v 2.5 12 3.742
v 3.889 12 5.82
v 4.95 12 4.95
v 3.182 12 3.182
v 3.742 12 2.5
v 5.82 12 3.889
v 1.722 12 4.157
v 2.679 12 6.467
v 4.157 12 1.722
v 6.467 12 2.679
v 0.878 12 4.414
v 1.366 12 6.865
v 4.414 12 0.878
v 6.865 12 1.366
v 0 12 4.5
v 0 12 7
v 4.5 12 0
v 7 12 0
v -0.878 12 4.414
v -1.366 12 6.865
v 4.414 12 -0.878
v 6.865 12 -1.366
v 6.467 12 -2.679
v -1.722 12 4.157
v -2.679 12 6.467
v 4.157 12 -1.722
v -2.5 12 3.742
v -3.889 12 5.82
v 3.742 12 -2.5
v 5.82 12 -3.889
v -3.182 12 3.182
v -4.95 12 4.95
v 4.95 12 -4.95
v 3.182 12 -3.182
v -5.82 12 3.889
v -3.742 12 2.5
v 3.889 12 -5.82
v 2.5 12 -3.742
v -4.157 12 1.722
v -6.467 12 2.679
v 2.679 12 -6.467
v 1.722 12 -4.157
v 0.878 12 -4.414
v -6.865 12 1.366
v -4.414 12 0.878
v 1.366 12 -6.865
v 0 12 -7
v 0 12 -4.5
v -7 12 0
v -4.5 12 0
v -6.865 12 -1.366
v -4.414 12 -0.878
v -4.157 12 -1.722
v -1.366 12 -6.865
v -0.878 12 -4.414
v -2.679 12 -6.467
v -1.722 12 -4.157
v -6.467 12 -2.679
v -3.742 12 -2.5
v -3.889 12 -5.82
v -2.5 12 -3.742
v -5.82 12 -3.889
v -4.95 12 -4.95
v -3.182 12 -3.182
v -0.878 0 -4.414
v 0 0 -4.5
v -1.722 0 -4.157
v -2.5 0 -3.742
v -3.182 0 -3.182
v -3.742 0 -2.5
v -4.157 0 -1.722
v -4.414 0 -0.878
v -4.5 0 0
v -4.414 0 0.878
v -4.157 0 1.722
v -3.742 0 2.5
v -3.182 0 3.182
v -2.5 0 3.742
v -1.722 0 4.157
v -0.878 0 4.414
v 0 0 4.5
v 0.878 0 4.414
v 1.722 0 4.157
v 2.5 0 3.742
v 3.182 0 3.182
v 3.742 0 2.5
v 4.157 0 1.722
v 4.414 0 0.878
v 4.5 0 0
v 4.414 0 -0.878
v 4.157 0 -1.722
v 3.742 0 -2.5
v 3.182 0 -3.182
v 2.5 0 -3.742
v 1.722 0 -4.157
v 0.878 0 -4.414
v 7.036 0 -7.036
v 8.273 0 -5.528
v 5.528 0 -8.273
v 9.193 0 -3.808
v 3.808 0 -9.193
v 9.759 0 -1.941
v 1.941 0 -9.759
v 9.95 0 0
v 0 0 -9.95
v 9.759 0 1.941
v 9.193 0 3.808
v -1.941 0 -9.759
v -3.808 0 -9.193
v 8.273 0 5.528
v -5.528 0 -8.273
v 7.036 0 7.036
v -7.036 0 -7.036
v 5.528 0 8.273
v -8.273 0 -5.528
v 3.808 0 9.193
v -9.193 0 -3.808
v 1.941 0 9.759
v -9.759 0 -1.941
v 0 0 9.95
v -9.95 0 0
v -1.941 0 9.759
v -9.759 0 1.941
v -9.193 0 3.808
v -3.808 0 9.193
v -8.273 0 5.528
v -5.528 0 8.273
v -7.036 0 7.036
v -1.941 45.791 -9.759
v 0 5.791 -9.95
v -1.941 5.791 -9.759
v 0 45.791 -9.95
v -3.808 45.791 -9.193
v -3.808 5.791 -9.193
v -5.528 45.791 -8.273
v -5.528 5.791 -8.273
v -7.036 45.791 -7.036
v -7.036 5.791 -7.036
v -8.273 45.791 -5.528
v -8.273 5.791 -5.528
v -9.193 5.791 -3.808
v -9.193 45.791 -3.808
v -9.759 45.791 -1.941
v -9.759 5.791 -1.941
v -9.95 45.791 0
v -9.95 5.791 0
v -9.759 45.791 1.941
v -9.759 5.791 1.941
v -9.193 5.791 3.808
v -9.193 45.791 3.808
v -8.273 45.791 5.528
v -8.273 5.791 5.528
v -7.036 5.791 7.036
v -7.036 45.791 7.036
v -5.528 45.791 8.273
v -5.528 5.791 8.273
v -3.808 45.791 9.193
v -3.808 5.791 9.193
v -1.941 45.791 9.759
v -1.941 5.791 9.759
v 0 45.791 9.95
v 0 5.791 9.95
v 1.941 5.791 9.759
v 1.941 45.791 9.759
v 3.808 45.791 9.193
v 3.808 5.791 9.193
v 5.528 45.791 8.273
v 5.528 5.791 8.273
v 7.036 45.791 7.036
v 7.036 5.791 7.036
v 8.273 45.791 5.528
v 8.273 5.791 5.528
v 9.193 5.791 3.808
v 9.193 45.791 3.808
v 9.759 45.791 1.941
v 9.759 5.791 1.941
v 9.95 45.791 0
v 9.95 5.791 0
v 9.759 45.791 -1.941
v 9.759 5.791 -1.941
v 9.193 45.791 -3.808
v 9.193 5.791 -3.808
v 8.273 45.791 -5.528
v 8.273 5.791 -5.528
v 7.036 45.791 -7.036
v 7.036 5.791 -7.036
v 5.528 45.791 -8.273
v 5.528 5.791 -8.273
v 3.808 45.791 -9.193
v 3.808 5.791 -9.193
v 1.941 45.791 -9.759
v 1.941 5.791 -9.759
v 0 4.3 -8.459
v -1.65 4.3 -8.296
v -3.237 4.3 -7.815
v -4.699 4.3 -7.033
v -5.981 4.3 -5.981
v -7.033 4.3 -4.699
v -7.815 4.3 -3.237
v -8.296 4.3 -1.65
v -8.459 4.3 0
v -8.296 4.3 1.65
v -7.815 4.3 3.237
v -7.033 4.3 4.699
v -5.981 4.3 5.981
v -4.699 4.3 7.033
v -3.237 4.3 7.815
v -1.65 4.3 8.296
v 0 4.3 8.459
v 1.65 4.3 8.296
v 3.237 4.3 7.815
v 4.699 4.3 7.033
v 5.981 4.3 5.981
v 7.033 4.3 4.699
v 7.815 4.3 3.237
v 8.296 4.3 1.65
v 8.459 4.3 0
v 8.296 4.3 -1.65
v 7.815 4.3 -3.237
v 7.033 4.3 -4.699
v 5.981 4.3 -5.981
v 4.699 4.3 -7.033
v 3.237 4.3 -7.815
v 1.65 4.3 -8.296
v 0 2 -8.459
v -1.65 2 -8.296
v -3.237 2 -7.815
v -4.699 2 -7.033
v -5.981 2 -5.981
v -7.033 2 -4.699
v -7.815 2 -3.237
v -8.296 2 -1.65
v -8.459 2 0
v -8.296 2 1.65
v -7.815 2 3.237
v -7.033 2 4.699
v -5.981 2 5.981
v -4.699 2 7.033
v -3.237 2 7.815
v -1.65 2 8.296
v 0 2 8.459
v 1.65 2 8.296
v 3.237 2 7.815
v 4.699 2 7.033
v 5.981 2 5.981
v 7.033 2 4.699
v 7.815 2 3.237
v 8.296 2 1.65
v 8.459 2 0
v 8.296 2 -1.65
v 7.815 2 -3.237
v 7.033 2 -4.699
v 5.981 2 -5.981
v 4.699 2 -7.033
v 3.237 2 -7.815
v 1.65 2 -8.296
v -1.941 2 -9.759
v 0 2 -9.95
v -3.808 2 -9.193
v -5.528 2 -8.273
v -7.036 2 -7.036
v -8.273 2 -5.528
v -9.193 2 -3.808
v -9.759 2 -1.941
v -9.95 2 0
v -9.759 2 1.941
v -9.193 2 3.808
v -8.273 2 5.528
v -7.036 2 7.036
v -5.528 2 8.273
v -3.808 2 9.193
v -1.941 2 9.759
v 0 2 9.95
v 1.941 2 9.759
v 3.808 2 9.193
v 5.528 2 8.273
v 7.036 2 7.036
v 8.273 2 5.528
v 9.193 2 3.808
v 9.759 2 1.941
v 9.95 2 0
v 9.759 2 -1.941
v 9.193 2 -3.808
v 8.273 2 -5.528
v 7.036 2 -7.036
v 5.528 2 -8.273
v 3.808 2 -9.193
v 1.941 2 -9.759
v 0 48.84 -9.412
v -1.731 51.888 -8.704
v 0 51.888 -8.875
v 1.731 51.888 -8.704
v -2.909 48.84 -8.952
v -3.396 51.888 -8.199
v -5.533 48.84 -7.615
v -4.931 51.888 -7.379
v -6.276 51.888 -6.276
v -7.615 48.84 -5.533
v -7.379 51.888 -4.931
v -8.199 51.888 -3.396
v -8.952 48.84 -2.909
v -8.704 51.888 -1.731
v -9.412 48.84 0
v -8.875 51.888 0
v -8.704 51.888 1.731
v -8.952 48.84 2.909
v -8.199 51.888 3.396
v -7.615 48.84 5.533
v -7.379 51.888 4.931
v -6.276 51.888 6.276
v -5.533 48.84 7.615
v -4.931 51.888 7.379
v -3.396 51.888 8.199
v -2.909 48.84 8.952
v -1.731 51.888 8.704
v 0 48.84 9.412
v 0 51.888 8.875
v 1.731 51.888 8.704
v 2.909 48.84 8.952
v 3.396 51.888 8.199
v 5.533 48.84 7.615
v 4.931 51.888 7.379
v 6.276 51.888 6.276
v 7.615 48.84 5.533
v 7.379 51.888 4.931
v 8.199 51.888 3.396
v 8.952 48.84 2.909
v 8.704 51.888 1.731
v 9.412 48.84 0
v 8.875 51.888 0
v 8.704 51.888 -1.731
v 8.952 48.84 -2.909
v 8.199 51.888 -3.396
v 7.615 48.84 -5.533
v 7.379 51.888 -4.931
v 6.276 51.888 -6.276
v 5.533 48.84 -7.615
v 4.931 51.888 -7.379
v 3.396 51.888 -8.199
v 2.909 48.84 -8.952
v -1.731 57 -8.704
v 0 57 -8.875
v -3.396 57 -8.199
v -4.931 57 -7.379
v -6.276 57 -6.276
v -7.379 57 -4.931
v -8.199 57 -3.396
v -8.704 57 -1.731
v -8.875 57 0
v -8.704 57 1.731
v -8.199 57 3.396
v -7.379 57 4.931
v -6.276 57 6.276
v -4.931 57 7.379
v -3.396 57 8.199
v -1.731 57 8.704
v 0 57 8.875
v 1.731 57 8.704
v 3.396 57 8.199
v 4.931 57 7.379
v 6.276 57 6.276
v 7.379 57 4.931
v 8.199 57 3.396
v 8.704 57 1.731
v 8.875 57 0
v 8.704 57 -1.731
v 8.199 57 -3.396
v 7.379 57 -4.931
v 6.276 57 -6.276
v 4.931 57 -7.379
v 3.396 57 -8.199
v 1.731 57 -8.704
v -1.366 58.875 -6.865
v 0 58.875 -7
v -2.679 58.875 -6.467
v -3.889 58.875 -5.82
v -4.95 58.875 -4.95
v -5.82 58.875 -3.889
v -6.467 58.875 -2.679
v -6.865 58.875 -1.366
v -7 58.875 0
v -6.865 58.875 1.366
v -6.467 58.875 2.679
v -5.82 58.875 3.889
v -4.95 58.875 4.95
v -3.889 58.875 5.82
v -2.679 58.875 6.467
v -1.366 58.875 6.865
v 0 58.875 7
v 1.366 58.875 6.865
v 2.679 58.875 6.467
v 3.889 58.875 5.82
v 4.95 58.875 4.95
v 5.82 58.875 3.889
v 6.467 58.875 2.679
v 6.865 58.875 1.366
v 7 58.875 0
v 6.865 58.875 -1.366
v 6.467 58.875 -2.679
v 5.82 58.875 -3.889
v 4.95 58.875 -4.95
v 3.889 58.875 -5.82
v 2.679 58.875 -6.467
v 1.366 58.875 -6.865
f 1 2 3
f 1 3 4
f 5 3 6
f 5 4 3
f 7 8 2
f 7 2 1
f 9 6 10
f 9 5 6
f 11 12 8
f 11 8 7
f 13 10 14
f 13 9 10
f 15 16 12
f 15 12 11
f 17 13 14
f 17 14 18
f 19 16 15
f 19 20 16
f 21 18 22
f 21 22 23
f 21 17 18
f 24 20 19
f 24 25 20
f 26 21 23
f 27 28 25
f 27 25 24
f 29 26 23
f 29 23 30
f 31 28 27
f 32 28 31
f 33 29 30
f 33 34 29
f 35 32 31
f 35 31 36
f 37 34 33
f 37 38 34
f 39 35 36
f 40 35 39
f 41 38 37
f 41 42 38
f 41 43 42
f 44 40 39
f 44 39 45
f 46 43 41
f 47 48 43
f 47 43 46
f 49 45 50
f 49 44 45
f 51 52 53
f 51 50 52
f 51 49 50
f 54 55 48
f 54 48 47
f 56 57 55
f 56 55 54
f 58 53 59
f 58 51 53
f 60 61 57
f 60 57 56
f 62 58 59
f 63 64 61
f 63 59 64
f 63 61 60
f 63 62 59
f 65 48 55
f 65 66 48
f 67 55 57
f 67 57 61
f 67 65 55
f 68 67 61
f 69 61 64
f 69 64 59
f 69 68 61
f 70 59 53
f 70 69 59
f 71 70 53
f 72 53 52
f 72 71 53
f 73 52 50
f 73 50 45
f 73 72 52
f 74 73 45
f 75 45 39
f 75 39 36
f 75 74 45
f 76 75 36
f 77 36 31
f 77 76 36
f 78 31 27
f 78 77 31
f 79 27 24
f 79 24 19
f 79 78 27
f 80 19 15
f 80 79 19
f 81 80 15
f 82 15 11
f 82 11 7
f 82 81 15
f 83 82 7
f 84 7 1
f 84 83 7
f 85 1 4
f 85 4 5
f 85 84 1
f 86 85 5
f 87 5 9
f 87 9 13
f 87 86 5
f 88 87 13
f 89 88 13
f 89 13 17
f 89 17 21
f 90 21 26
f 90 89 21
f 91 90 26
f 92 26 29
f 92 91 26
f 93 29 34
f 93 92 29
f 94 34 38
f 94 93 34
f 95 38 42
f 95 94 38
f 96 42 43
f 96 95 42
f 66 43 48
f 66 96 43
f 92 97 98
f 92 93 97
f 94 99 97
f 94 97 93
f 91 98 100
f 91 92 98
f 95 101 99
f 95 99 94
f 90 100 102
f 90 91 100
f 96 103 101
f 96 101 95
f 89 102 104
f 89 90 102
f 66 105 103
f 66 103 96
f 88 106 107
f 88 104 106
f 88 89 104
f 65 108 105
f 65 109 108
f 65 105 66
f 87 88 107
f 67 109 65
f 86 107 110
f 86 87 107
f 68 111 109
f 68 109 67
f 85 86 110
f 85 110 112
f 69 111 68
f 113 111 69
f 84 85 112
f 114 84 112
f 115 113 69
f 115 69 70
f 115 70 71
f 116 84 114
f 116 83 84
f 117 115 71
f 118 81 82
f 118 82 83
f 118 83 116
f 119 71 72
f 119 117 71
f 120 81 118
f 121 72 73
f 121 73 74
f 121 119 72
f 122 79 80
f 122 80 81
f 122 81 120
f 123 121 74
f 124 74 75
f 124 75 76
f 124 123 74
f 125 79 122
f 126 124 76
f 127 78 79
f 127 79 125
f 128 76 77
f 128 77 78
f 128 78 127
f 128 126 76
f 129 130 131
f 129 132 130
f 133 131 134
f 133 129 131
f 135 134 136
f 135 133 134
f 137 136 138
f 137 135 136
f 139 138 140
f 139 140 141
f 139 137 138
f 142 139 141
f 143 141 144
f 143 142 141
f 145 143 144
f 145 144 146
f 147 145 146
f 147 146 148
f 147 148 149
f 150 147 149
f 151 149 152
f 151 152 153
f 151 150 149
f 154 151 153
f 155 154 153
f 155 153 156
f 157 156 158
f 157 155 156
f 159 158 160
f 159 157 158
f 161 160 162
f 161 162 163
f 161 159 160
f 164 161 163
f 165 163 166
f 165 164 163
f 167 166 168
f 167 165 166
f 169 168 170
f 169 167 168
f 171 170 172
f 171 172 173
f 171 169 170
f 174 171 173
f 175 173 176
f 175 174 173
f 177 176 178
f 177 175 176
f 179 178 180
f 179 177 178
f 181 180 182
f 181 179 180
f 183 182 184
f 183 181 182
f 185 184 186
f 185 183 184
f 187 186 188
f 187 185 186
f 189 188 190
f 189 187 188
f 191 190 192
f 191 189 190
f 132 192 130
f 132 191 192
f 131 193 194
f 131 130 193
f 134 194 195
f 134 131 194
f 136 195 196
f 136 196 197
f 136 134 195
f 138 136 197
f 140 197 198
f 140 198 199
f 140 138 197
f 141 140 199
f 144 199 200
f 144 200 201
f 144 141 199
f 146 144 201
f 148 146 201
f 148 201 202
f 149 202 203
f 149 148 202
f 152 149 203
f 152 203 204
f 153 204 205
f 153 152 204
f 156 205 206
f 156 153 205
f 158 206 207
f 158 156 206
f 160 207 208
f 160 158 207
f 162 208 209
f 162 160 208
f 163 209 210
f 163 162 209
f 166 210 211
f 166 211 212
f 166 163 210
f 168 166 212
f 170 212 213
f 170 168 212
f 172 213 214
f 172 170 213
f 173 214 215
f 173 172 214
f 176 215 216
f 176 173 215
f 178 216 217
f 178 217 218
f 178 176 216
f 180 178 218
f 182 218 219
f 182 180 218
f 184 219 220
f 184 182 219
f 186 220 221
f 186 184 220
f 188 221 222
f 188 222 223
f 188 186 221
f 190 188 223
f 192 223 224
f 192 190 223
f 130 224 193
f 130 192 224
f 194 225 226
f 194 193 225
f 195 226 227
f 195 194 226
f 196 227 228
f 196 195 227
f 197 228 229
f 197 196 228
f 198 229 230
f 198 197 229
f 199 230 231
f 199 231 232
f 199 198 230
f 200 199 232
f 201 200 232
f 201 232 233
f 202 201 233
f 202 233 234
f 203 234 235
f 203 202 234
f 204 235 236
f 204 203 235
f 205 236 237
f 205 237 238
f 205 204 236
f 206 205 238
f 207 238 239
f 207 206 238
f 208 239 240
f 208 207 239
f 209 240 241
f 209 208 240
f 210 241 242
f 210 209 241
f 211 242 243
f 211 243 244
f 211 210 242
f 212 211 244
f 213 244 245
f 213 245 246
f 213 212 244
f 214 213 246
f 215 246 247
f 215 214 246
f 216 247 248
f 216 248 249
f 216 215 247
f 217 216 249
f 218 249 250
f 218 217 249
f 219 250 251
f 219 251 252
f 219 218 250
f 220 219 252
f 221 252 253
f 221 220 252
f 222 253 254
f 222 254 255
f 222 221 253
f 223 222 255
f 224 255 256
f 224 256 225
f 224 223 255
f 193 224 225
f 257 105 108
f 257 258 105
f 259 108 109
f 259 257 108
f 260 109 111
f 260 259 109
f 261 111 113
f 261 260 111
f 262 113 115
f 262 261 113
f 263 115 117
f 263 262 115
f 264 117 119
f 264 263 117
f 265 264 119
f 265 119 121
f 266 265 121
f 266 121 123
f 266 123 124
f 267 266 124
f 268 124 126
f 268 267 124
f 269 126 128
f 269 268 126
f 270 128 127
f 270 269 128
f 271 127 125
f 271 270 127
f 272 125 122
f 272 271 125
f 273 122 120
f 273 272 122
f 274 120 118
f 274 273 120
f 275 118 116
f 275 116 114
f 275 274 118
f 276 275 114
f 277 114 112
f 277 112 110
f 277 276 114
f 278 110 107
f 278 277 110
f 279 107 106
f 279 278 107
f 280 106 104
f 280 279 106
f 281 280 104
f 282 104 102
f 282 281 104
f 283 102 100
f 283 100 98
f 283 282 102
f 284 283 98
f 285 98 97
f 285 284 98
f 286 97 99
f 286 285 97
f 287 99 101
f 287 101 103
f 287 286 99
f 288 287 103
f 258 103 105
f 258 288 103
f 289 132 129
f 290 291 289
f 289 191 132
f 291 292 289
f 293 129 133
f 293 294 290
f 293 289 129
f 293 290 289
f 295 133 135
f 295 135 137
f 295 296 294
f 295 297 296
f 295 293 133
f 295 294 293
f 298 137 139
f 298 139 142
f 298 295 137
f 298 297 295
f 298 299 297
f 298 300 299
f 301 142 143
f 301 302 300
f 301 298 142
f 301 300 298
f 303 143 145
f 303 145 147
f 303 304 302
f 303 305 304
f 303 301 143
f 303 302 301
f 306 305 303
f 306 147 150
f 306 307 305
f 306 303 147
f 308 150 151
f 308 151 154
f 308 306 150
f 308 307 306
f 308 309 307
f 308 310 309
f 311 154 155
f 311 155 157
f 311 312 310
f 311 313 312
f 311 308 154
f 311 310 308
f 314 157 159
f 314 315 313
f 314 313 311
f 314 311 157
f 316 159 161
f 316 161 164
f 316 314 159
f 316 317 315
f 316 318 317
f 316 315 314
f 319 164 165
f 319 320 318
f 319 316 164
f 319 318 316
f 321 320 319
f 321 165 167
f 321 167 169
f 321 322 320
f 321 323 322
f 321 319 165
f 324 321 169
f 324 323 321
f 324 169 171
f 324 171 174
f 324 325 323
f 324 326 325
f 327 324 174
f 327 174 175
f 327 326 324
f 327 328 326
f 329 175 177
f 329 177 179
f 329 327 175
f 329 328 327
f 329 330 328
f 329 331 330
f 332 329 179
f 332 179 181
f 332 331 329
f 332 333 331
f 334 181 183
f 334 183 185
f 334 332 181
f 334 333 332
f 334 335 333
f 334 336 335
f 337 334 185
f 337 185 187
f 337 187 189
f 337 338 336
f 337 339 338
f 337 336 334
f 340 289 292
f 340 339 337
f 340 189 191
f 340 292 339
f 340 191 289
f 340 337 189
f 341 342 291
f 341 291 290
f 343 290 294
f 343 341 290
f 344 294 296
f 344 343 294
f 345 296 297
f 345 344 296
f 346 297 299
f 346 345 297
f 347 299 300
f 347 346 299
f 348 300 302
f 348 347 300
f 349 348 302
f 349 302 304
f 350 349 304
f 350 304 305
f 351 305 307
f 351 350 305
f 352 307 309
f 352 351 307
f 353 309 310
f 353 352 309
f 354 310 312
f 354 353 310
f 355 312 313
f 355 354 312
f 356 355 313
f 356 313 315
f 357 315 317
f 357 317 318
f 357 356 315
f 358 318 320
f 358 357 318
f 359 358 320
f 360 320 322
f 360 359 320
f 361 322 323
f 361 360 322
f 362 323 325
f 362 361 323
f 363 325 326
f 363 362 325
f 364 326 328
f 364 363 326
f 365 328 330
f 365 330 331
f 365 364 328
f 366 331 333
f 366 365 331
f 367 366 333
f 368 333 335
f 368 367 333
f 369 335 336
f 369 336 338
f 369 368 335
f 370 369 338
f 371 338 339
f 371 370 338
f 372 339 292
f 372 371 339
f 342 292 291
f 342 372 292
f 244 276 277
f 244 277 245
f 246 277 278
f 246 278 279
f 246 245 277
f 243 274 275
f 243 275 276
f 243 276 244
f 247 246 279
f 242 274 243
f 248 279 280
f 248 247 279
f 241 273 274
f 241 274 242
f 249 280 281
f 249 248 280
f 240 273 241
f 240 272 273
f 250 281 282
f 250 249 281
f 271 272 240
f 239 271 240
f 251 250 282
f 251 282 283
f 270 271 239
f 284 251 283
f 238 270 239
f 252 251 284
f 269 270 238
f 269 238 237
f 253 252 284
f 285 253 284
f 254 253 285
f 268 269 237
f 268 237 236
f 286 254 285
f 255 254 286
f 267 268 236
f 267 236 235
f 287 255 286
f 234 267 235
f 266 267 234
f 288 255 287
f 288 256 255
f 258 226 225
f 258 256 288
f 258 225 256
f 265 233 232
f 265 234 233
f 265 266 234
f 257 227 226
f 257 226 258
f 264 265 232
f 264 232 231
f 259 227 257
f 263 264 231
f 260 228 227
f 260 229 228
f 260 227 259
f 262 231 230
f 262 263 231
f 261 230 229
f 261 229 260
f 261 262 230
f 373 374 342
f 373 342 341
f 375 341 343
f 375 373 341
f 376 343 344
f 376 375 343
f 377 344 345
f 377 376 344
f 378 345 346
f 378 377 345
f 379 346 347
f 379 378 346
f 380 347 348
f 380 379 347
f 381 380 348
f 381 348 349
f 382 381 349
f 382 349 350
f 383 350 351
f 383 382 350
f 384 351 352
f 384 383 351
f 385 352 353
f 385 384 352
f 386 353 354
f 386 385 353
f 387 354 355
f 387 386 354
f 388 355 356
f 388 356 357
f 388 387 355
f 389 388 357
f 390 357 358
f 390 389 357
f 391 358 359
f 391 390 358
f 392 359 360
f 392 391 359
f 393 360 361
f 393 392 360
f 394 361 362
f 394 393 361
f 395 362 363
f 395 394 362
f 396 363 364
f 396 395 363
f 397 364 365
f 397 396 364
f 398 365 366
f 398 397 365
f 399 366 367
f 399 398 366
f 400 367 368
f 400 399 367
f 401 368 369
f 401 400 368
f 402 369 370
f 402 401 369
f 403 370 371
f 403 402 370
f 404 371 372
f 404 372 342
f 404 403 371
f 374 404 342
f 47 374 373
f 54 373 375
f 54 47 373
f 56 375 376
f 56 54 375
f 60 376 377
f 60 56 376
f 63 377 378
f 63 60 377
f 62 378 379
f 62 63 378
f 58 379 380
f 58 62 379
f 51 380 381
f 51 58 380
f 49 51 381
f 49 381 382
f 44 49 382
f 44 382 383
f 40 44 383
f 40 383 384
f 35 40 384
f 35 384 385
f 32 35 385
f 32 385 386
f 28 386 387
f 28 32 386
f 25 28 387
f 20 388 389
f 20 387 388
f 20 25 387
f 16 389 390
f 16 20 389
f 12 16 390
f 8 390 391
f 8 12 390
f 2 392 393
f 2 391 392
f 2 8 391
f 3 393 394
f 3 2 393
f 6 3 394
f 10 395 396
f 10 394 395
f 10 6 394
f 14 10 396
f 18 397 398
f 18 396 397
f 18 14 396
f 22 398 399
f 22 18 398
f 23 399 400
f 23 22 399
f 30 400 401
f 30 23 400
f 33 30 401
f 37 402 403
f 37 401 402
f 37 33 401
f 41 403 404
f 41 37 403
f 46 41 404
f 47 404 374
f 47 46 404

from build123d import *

# Parameters (mm, degrees)
CHAMFER_1_SIZE = 3


with BuildPart() as part:
    # 스케치3 → 회전1 (revolve)
    with BuildSketch(Plane(origin=(0, 0, 0), x_dir=(0, 0, -1), z_dir=(1, 0, 0))):
        Polygon((4.5, 0), (9.95, 0), (9.95, 2), (8.458613311, 2), (8.458613311, 4.3), (9.95, 5.791386689), (9.95, 45.791386689), (8.875, 51.888014645), (8.875, 60), (7, 60), (7, 12), (4.5, 12), align=None)
    revolve(axis=Axis((0, 0, 0), (0, 1, 0)))

    # 모따기1
    # the kernel refuses this chamfer: 3 mm, written as the material it takes off along each edge
    with BuildSketch(Plane(origin=(0, 60, 0), x_dir=(0, 0, -1), z_dir=(1, 0, 0))) as chamfer_1_piece_1:
        Polygon((8.875, -CHAMFER_1_SIZE), (8.875 - CHAMFER_1_SIZE, 0), (8.875, 0), align=None)
    revolve(axis=Axis((0, 60, 0), (0, 1, 0)), mode=Mode.SUBTRACT)


solid = part.part
